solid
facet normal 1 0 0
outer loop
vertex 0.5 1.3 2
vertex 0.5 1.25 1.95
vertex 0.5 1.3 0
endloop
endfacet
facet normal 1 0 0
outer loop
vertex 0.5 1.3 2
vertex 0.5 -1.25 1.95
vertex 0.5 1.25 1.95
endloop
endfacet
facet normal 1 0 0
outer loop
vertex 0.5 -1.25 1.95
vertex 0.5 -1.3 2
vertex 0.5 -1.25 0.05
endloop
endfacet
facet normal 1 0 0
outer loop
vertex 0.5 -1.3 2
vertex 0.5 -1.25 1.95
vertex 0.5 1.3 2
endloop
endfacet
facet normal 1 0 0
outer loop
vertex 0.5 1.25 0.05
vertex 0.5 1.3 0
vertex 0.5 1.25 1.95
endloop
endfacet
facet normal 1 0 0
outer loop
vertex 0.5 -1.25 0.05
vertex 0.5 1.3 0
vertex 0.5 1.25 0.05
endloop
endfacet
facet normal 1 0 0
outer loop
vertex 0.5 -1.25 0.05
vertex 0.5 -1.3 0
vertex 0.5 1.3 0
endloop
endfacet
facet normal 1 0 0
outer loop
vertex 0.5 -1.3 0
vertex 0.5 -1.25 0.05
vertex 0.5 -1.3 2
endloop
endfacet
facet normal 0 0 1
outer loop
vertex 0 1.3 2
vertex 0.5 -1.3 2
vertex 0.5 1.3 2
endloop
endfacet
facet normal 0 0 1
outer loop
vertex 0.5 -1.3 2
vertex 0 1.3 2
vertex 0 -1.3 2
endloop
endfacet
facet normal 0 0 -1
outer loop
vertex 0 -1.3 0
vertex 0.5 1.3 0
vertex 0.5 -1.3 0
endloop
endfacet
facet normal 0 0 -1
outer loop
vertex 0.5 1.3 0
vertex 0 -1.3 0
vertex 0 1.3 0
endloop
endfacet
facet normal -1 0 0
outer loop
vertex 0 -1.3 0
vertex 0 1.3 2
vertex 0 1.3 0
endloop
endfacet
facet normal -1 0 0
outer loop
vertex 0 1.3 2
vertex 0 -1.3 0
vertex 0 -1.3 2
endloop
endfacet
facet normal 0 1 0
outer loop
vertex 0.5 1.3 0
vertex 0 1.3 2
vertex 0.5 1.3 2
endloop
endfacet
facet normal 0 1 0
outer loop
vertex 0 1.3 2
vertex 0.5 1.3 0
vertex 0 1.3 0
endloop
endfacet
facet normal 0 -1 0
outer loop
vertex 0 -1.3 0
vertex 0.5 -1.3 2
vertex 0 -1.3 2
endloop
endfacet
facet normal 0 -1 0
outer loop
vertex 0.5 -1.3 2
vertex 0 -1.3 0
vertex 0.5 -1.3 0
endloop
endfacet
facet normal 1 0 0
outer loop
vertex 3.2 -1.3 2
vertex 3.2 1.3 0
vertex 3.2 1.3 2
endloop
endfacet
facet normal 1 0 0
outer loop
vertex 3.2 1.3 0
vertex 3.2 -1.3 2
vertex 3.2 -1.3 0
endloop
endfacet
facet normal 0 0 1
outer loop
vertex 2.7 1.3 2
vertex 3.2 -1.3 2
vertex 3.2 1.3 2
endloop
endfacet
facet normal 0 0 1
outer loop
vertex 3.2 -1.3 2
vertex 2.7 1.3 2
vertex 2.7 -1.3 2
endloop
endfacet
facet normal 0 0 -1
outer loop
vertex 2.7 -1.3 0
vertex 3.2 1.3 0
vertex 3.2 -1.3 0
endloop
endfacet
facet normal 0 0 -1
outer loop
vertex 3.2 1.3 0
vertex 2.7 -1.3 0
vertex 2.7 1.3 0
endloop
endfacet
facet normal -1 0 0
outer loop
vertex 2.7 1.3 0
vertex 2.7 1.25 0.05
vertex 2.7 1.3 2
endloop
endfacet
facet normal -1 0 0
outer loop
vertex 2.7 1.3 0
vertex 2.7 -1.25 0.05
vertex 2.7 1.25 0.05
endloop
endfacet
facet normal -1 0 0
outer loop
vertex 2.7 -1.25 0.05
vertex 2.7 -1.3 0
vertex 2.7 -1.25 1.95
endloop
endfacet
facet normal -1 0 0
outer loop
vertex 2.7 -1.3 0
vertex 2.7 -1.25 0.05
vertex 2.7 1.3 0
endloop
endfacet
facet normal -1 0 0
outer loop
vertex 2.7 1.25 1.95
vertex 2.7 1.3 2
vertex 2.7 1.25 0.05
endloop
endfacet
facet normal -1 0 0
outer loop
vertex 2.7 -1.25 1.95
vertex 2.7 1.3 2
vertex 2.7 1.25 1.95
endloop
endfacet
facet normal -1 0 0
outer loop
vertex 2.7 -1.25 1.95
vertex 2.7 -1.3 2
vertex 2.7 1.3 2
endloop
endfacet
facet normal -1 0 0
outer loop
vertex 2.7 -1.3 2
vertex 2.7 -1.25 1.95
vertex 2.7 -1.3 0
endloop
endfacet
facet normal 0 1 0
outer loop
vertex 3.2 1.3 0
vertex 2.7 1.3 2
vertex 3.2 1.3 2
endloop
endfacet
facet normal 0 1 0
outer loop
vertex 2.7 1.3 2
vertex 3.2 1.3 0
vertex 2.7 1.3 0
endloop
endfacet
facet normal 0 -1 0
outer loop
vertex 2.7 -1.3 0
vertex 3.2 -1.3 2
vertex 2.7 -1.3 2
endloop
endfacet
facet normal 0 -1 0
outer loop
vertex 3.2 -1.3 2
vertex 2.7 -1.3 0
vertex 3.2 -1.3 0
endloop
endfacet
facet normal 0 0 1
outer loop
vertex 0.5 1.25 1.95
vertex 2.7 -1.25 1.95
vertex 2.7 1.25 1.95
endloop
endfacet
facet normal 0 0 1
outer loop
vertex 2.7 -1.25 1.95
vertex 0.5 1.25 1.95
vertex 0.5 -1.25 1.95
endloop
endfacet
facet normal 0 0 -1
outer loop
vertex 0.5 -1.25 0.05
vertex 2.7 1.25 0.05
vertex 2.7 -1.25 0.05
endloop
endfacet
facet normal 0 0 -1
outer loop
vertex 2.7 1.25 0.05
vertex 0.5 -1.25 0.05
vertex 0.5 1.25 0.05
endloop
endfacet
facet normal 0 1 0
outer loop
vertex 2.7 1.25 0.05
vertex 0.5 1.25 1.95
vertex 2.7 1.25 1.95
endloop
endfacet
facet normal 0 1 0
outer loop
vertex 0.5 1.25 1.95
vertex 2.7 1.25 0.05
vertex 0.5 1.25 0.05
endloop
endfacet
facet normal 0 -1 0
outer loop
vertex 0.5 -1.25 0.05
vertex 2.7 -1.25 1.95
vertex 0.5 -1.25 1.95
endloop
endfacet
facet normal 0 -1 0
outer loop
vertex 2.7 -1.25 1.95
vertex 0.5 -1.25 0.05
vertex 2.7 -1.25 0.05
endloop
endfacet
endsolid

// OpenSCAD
// Can be 00105,0201,0402,0603,0805,1206,1210,2010 or 2512
type="1210";

th = 0.05;

th = type=="00105" ? 0.02:
    type=="0201" ? 0.03:
    type=="0402" ? 0.04: 0.05;

L = type=="00105" ? 0.4:
    type=="0201" ? 0.6:
    type=="0402" ? 1.0:
    type=="0603" ? 1.6:
    type=="0805" ? 2.0 :
	type=="1206" ? 3.1:
	type=="1210" ? 3.2:
	type=="2010" ? 5.0:
	type=="2512" ? 6.35: 0;

W = type=="00105" ? 0.2:
    type=="0201" ? 0.3:
    type=="0402" ? 0.5:
    type=="0603" ? 0.8:
    type=="0805" ? 1.25 :
	type=="1206" ? 1.55:
	type=="1210" ? 2.6:
	type=="2010" ? 2.5:
	type=="2512" ? 3.2: 0;

T = type=="00105" ? 0.13:
    type=="0201" ? 0.23:
    type=="0402" ? 0.35:
    type=="0603" ? 0.7:
    type=="0805" ? 1.2 :
	type=="1206" ? 0.55:
	type=="1210" ? 2.0:
	type=="2010" ? 0.55:
	type=="2512" ? 0.55: 0;

t = type=="00105" ? 0.1:
    type=="0201" ? 0.15:
    type=="0402" ? 0.25:
    type=="0603" ? 0.35:
    type=="0805" ? 0.5:
	type=="1206" ? 0.50:
	type=="1210" ? 0.50:
	type=="2010" ? 0.60:
	type=="2512" ? 0.60: 0;

union()
{
	translate([0,-W/2])
		cube([t,W,T]);
	translate([L-t,-W/2])
		cube([t,W,T]);

	translate([th,-(W-th*2)/2,th])
		cube([L-th*2,W-th*2,T-th*2]);
}
